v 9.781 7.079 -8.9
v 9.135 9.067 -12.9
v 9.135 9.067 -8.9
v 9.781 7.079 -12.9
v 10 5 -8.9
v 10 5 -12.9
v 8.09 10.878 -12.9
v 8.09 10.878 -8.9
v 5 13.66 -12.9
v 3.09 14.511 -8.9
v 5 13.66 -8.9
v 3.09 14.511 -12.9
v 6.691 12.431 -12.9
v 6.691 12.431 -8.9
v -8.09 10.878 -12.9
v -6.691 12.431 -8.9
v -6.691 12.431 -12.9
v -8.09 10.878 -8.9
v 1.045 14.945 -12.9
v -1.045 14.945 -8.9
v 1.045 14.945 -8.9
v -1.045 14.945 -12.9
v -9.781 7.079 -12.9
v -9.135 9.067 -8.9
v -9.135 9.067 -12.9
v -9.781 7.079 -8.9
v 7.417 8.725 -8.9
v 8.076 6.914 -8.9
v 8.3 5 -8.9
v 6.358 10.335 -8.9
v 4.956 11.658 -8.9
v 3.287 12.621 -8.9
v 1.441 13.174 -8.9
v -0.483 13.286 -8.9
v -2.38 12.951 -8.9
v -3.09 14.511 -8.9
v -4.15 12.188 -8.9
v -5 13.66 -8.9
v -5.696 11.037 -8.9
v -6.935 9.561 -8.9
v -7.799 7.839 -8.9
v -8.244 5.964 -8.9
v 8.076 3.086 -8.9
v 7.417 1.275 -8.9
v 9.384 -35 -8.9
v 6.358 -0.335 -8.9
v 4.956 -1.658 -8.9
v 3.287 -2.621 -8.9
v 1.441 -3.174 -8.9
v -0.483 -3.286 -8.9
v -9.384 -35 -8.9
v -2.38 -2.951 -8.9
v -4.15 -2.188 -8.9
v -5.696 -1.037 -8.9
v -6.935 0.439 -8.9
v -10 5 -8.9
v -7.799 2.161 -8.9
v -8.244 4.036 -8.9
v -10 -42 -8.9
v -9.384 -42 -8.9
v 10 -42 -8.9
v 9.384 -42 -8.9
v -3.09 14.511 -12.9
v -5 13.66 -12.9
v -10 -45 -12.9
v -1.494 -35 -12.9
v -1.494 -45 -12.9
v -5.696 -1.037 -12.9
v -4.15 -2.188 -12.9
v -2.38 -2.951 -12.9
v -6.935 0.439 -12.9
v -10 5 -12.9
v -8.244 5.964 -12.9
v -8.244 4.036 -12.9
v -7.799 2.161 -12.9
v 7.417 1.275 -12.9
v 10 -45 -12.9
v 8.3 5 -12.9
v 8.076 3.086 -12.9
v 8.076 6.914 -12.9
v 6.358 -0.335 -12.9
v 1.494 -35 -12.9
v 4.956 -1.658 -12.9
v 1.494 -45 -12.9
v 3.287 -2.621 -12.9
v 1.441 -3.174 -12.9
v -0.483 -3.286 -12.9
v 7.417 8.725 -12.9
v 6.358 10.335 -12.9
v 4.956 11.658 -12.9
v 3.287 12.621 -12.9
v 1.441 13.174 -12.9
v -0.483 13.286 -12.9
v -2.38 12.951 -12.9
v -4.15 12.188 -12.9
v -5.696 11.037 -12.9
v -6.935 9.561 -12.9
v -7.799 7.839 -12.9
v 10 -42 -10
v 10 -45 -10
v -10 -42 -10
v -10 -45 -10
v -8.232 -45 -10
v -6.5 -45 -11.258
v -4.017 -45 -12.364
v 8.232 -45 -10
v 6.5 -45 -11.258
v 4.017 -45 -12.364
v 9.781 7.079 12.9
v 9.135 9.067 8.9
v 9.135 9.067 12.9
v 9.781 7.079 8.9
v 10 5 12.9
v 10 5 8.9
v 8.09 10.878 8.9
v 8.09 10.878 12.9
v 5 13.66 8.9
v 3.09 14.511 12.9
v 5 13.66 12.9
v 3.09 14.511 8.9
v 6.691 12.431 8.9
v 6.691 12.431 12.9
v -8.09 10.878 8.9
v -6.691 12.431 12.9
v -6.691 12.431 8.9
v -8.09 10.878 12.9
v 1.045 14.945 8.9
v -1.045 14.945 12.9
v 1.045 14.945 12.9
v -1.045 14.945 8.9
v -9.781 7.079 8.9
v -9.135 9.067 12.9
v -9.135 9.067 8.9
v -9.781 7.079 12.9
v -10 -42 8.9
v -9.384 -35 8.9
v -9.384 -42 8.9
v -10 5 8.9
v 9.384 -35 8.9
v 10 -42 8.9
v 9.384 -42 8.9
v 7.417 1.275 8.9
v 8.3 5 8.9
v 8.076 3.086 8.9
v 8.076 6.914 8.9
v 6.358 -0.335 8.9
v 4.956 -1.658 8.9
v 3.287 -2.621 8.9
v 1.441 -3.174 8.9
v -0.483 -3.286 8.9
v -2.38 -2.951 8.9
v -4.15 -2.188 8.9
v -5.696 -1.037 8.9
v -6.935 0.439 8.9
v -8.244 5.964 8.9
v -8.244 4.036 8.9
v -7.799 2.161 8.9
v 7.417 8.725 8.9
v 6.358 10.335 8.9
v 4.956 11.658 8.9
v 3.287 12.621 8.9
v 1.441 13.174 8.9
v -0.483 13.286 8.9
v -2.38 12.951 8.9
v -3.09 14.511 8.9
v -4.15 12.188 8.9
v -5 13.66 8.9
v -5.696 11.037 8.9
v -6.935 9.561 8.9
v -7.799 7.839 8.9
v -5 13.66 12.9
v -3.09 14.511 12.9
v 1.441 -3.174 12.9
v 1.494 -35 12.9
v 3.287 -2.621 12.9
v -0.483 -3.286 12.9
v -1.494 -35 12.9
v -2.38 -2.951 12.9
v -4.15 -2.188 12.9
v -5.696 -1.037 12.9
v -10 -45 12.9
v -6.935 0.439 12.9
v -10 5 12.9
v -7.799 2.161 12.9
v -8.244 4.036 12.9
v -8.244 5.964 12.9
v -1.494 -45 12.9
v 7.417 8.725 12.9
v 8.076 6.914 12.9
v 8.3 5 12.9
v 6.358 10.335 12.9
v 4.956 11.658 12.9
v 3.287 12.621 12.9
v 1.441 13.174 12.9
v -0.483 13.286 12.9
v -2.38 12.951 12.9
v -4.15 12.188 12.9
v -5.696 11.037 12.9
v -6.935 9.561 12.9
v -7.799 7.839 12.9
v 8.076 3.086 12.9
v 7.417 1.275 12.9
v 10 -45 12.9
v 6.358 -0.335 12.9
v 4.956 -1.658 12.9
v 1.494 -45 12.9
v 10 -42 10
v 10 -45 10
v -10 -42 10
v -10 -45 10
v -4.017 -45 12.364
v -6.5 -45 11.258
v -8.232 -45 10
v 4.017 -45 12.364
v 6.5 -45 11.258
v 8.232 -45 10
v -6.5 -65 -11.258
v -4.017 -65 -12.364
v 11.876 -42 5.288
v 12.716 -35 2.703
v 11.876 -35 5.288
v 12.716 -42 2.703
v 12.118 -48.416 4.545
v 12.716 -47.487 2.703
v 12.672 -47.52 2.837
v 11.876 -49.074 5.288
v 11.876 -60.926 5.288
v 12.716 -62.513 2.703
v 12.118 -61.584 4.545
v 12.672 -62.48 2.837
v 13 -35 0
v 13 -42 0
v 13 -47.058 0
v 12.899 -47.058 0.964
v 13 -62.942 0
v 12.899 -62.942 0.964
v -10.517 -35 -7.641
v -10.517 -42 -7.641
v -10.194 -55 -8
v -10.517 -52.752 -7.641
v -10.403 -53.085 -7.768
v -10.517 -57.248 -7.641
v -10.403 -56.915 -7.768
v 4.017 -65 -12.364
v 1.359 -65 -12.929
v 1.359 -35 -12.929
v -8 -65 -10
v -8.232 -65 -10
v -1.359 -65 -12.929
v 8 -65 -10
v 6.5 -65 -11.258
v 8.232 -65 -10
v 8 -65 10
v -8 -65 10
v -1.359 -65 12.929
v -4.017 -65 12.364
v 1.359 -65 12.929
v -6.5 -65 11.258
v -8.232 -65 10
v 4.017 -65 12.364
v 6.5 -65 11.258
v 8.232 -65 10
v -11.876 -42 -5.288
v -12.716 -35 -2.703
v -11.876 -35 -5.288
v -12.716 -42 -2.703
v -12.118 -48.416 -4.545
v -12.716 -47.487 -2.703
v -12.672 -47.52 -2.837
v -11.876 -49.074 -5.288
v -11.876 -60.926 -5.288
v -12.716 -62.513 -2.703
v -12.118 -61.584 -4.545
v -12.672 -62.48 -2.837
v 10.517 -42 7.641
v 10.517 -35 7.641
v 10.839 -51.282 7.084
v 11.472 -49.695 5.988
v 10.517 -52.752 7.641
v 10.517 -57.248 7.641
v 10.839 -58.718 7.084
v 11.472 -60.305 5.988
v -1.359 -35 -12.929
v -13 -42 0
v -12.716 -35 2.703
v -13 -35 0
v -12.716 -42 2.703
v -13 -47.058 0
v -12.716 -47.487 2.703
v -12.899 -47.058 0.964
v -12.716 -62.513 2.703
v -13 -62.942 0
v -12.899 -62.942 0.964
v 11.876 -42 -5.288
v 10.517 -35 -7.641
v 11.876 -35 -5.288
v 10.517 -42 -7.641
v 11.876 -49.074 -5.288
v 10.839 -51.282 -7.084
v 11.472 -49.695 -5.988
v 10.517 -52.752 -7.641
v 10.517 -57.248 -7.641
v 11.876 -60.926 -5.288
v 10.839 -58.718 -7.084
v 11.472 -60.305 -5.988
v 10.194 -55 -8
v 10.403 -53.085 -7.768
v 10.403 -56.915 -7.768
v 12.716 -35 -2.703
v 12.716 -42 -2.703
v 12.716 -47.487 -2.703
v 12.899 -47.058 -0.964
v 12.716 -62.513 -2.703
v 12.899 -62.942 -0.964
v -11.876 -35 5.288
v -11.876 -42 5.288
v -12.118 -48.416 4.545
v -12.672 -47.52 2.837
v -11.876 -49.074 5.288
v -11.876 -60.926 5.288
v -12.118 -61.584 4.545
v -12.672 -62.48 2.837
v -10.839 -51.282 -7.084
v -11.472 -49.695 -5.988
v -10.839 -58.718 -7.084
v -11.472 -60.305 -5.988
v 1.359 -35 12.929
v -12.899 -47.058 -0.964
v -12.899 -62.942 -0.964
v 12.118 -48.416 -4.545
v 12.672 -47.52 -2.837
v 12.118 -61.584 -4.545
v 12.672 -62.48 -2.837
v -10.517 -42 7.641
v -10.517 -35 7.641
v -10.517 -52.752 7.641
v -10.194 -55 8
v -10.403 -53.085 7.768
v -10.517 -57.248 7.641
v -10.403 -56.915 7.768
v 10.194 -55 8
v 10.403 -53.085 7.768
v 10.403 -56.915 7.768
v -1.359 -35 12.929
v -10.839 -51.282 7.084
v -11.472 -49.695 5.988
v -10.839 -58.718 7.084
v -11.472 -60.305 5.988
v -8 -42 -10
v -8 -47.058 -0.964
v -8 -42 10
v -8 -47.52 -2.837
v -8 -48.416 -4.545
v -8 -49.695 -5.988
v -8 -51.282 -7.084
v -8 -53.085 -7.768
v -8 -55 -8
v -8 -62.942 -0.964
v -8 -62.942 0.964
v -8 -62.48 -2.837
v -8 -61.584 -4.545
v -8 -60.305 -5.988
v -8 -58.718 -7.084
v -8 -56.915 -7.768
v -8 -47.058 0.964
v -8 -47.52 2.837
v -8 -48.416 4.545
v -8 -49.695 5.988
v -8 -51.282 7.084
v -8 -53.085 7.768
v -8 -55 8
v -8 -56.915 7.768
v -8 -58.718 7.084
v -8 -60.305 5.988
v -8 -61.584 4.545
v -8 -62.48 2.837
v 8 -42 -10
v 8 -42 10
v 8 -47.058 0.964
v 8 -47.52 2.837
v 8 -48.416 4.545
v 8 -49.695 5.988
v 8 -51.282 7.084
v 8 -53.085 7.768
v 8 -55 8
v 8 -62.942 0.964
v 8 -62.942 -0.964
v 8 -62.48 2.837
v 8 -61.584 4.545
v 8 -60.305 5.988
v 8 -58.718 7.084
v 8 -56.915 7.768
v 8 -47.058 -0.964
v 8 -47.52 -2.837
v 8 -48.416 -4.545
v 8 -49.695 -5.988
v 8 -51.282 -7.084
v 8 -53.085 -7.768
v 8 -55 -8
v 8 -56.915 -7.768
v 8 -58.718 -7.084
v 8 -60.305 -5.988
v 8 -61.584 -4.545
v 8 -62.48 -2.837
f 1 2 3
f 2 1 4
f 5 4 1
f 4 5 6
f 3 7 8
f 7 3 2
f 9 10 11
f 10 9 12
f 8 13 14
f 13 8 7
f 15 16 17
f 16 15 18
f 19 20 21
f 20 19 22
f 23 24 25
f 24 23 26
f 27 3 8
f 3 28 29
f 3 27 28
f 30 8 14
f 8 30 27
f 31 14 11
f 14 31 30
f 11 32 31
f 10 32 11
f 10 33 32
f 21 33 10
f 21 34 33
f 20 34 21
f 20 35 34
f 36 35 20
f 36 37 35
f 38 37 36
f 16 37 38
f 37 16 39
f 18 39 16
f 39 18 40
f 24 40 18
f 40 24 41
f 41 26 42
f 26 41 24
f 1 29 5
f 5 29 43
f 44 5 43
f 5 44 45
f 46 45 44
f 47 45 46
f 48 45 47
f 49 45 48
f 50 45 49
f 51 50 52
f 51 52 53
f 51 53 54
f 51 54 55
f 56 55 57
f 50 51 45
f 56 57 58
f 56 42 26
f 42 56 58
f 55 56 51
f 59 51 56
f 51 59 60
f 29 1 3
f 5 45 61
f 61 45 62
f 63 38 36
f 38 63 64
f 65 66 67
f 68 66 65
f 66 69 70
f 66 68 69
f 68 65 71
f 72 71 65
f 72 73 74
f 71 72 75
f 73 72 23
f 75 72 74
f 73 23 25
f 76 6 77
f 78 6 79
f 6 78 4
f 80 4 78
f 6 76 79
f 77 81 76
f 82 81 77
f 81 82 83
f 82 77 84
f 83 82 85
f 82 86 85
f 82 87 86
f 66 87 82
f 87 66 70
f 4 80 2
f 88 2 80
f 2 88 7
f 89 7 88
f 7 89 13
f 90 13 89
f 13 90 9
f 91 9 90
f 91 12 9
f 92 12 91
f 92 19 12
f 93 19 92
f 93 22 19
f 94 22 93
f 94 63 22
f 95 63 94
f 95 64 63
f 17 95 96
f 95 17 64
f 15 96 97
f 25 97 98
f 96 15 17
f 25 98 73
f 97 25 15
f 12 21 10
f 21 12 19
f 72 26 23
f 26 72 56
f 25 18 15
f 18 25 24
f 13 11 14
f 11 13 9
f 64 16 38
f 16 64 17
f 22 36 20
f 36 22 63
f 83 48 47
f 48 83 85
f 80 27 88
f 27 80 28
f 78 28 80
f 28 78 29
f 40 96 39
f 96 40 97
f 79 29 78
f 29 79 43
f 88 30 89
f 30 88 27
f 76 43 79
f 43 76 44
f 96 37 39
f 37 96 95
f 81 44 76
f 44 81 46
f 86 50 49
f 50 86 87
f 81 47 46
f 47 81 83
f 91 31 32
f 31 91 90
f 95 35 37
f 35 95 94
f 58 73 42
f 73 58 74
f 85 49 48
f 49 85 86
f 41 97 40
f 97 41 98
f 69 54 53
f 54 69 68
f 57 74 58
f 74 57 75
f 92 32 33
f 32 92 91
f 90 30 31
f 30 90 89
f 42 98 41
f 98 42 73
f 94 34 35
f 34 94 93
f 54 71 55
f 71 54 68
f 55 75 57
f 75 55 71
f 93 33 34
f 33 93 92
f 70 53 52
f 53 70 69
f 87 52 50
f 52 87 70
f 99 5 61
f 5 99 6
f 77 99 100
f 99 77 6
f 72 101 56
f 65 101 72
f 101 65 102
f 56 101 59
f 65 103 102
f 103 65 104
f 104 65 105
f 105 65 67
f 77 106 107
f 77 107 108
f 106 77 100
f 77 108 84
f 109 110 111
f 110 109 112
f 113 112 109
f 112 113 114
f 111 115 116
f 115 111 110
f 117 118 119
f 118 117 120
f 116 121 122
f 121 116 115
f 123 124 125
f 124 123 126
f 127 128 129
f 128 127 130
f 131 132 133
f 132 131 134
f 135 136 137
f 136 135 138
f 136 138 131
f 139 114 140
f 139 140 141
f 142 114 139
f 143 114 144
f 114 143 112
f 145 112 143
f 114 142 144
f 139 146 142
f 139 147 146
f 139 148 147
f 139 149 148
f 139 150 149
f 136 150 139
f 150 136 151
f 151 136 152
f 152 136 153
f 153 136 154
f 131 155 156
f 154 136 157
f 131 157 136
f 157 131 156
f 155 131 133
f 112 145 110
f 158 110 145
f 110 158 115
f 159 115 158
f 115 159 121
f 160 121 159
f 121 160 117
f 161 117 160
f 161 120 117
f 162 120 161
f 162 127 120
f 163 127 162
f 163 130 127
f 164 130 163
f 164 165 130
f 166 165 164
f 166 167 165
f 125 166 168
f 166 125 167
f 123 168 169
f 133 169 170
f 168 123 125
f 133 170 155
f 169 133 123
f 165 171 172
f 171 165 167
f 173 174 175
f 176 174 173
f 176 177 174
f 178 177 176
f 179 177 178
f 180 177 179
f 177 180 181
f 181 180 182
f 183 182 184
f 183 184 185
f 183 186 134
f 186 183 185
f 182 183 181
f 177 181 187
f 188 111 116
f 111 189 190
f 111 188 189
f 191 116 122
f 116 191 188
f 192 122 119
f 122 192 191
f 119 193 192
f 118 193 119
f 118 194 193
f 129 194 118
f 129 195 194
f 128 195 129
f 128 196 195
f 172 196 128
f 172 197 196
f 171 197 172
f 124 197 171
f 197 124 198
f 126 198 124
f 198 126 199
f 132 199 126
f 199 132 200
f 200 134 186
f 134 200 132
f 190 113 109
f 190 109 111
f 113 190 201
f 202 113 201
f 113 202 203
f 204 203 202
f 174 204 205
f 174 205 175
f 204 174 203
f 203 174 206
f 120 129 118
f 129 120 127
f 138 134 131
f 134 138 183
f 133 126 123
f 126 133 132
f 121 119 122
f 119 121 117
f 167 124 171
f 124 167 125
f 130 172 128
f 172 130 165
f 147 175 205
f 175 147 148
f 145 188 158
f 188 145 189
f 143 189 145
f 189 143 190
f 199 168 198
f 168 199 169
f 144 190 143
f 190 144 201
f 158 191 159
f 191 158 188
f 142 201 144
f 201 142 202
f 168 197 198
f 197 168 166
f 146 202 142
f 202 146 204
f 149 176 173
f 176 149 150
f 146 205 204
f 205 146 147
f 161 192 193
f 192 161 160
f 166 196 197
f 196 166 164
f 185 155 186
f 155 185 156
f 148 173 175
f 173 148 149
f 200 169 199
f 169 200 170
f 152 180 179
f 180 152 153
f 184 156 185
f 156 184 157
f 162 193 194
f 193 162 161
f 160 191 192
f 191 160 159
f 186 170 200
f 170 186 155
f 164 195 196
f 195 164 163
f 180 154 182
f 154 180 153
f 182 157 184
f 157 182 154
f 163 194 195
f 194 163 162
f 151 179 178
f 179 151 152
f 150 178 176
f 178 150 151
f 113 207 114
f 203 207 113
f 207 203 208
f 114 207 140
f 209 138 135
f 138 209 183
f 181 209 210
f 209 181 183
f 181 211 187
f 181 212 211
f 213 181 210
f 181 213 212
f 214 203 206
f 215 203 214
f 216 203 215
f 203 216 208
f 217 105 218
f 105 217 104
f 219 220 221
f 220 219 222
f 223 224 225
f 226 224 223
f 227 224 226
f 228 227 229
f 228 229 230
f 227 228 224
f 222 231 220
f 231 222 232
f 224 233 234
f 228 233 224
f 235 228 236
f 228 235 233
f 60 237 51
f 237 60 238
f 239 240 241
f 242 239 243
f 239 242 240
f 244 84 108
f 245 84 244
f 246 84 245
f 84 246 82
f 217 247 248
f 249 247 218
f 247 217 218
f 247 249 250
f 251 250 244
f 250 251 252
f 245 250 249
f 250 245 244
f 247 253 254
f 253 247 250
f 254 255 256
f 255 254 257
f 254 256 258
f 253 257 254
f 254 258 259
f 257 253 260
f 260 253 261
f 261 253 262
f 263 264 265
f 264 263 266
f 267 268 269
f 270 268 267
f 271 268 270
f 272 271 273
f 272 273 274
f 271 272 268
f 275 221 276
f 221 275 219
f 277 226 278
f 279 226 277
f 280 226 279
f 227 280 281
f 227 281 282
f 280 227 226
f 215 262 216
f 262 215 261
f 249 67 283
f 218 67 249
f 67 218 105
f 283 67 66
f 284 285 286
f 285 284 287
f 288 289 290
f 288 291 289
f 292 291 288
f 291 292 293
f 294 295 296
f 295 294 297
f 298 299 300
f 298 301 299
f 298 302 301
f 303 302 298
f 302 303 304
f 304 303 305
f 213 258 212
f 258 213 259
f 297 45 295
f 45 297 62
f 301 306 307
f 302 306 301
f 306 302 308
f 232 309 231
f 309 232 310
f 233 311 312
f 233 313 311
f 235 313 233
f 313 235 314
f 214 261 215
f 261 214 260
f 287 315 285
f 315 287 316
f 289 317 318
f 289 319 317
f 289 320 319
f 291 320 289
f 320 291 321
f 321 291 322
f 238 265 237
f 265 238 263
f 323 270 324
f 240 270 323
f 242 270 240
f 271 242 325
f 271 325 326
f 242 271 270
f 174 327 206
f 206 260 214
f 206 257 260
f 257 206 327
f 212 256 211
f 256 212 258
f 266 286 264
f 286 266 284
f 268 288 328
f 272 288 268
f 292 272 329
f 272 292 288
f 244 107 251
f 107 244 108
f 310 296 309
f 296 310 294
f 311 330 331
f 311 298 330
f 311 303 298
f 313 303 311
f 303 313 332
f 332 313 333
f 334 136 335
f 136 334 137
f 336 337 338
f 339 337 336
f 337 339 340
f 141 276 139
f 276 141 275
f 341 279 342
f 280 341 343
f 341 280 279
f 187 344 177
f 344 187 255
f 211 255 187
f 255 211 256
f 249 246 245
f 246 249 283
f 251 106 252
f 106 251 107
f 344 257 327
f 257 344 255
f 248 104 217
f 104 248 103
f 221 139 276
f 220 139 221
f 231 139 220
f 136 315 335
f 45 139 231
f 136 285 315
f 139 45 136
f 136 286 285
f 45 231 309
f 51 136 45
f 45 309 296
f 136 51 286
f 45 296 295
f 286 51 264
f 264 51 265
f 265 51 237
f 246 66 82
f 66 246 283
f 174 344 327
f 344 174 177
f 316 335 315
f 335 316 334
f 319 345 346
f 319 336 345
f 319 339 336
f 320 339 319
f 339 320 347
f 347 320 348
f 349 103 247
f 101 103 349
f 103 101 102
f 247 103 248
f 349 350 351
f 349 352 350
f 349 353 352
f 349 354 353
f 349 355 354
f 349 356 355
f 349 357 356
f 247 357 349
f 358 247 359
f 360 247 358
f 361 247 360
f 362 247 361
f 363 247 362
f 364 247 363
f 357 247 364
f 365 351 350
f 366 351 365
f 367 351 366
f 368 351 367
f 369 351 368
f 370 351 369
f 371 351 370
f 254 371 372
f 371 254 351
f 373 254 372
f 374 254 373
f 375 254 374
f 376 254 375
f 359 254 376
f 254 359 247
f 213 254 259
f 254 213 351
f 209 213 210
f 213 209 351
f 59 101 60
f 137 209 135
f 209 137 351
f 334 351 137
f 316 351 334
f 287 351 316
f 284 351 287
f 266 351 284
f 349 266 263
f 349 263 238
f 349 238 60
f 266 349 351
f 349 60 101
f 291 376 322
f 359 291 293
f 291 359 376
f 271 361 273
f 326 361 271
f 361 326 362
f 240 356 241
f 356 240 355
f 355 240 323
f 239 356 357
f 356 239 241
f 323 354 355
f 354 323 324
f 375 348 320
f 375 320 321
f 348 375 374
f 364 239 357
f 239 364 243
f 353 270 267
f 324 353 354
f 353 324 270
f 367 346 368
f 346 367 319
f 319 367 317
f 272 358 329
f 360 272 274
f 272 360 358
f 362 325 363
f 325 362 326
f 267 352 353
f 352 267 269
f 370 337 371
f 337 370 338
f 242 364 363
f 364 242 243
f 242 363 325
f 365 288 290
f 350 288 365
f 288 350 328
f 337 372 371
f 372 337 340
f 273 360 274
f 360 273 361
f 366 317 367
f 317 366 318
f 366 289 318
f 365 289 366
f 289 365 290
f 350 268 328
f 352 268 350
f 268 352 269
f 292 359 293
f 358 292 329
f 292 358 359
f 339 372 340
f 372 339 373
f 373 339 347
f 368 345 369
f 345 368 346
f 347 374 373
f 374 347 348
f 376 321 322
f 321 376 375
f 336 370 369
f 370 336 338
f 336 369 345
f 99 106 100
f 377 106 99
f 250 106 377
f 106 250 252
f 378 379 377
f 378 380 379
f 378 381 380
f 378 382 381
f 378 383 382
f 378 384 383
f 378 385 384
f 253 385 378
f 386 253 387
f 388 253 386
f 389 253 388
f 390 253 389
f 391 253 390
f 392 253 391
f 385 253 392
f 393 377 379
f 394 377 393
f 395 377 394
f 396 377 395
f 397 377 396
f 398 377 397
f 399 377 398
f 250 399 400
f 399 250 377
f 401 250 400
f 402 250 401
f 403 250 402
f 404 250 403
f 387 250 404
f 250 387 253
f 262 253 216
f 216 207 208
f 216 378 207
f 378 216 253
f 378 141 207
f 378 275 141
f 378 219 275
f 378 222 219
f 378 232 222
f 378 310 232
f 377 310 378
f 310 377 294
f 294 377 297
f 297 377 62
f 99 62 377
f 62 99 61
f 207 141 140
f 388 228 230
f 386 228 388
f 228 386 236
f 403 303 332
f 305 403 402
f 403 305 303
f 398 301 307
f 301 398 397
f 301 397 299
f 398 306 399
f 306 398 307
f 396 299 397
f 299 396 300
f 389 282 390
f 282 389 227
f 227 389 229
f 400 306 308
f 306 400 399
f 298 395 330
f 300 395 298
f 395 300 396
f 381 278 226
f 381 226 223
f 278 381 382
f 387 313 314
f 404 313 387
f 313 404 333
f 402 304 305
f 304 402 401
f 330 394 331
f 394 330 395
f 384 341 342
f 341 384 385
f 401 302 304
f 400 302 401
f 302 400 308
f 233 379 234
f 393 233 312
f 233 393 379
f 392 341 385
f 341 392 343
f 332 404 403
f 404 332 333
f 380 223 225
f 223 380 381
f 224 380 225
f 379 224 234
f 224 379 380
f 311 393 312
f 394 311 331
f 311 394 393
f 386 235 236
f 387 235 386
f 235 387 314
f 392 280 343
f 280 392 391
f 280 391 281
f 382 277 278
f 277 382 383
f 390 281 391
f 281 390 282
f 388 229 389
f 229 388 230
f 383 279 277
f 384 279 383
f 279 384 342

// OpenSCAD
module core() {
	translate( [0,-35,0] )
	rotate( 90, [1,0,0] )
	cylinder( r=13, h=30 );

	union() {
		for( i=[-1:2:1] ) {
			scale( [1,1,i] )
			translate( [0,5,8.9] ) {
				difference() {
					cylinder( r=10, h=4 );
					translate([0,0,-1]) cylinder( r=8.3, h=6 );
				}
			
				difference() {
					translate([-10,-50,0]) {
						cube( [20,50,4] );
					}
					translate([0,0,-1]) cylinder( r=10, h=6 );
				}
			}
		}
	}
}

module rem() {
	union() {
		for( i=[-1:2:1] ) {
			scale( [1,1,i] )
			translate( [0,0,10] ) {
				difference() {
					translate([-10,-20,-2])
						cube( [20,33,10] );
					translate([0,0,-3]) cylinder( r=8, h=6 );
				}
			
			}
		}
	}
}

difference() {
	core( 0 );
	translate( [0,-55,0] ) rotate( 90, [0,1,0]) rem();
}
